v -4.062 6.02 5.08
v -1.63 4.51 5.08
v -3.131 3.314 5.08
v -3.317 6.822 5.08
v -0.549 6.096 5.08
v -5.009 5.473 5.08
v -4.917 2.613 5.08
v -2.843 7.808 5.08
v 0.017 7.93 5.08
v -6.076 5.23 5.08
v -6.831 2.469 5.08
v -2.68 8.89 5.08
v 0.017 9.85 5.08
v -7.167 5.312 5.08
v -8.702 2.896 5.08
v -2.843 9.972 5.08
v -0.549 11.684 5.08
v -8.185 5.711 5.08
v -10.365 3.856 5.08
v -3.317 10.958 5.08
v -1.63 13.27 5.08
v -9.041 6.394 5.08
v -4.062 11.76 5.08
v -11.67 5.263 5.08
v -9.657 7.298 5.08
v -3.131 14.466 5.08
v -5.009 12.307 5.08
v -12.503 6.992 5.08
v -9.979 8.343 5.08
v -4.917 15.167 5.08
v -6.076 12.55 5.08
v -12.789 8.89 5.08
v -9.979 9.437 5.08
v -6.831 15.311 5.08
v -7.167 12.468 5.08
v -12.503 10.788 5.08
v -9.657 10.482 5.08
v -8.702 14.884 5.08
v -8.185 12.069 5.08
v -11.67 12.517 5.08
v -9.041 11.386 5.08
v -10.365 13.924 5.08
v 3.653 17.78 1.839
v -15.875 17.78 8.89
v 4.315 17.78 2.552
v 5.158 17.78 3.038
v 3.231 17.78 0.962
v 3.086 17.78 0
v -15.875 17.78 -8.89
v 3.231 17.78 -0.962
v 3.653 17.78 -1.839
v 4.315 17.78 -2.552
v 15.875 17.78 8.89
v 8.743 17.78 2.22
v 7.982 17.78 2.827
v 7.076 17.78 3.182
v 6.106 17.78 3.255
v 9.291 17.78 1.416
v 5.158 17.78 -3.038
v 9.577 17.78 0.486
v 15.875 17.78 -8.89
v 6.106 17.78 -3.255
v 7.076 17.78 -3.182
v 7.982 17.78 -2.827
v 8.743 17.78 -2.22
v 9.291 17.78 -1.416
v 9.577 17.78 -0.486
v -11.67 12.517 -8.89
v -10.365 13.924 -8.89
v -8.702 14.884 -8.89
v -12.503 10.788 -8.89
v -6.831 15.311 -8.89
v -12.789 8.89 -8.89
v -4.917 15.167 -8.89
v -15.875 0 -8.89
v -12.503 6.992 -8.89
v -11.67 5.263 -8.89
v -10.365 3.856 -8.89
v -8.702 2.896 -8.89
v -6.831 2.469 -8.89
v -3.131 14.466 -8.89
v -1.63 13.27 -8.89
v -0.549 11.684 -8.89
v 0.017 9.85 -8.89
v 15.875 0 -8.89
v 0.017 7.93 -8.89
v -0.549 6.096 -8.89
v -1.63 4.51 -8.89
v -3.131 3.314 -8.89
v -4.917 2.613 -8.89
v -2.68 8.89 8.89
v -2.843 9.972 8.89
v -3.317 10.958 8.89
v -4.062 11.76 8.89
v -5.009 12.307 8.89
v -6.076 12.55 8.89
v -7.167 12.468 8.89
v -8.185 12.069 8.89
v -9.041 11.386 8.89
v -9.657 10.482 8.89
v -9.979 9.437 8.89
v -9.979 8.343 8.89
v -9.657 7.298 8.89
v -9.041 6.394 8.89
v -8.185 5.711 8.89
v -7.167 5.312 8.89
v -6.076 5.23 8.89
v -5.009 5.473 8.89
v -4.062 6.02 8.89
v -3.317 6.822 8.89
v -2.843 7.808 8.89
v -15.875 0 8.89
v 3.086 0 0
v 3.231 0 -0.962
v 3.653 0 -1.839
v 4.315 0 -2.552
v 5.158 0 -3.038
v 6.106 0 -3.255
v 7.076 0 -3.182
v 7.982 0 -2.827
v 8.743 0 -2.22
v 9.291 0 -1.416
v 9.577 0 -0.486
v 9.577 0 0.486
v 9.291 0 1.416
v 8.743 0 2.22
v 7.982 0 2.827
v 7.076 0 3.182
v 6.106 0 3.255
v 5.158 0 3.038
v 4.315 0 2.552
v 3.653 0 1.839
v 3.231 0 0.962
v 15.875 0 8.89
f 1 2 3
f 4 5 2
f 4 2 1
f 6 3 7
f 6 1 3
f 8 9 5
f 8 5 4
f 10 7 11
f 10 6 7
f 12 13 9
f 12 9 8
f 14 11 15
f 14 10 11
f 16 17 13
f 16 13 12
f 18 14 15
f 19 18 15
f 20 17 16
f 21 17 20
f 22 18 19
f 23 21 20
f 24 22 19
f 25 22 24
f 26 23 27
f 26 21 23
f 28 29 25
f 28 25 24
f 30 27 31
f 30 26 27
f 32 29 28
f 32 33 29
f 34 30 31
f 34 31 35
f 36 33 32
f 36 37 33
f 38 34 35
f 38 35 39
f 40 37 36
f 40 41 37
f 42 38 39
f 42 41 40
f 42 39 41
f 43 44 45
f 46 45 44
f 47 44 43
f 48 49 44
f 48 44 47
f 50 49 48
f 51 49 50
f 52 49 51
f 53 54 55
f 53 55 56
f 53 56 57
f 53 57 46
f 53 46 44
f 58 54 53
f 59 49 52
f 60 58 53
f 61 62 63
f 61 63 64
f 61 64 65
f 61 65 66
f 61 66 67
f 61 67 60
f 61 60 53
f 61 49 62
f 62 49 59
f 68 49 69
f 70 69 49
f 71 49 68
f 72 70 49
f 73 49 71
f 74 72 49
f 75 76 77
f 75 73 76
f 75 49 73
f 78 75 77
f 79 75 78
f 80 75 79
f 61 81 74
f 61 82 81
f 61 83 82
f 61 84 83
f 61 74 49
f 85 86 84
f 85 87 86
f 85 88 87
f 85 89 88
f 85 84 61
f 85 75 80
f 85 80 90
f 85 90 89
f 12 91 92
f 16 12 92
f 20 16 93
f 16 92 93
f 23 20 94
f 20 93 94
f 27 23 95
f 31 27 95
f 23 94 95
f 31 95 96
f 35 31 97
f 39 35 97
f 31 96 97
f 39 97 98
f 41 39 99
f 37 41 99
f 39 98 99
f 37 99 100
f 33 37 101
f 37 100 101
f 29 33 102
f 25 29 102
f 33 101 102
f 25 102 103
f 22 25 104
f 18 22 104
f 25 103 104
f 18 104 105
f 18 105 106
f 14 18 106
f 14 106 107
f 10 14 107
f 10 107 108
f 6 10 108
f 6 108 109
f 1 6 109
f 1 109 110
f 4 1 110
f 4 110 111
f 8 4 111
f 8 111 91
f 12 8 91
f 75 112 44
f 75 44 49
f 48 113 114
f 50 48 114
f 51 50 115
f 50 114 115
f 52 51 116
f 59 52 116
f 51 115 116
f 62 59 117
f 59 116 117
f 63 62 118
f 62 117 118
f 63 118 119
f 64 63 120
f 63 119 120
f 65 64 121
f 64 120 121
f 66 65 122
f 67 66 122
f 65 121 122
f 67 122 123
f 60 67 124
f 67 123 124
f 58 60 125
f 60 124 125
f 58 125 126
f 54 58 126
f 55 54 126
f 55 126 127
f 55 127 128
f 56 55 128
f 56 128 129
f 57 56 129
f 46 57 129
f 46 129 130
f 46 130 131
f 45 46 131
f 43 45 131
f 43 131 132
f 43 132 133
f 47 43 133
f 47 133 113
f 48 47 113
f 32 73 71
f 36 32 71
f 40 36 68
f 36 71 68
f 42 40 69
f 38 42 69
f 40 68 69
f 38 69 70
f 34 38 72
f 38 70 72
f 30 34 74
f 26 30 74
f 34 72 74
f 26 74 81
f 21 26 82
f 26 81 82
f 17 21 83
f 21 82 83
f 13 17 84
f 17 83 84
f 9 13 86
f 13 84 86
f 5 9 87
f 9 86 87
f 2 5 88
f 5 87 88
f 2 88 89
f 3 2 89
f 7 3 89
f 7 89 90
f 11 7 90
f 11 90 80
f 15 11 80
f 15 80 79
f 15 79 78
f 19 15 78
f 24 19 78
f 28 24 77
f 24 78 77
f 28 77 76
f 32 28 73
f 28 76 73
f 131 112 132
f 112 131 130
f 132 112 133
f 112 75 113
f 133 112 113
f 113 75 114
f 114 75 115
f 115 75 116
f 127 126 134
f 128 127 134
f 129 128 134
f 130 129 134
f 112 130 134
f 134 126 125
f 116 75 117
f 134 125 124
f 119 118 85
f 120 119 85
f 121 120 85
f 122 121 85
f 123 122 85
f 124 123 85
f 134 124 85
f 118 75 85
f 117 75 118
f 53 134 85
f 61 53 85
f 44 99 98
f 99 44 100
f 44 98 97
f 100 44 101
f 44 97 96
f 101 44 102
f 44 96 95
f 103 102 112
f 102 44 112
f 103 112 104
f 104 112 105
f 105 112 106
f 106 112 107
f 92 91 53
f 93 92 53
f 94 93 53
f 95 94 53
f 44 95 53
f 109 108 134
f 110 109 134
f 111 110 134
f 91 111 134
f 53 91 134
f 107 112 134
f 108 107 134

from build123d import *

# Parameters (mm, degrees)
SKETCH1_W               = 31.75
SKETCH1_H               = 17.78
BOSS_EXTRUDE1_DEPTH     = 17.78
SKETCH3_R               = 6.4389
CUT_EXTRUDE1_DEPTH      = 13.97
CUT_EXTRUDE2_REACH      = 31.737
SKETCH2_R               = 3.6703
F_1_4_CLEARANCE_HOLE1_D = 6.5278


with BuildPart() as part:
    # Sketch1 → Boss-Extrude1 (new body)
    with BuildSketch(Plane(origin=(0, 0, 0), x_dir=(1, 0, 0), z_dir=(0, 1, 0))):
        Rectangle(SKETCH1_W, SKETCH1_H)
    extrude(amount=BOSS_EXTRUDE1_DEPTH)

    # Sketch3 → Cut-Extrude1 (cut)
    with BuildSketch(Plane(origin=(0, 0, -8.89), x_dir=(-1, 0, 0), z_dir=(0, 0, -1))):
        with Locations((6.35, 8.89)):
            Circle(SKETCH3_R)
    extrude(amount=-CUT_EXTRUDE1_DEPTH, mode=Mode.SUBTRACT)

    # Sketch2 → Cut-Extrude2 (cut, up to next)
    with BuildSketch(Plane.XY.offset(8.89), mode=Mode.PRIVATE) as cut_extrude2_sk1:
        with Locations((-6.35, 8.89)):
            Circle(SKETCH2_R)
    cut_extrude2_tool1 = extrude(cut_extrude2_sk1.sketch, amount=-CUT_EXTRUDE2_REACH, mode=Mode.PRIVATE) & part.part
    add(cut_extrude2_tool1.solids().sort_by_distance((-6.35, 8.89, 8.89))[0], mode=Mode.SUBTRACT)

    # 1/4 Clearance Hole1 (through all)
    with Locations(Plane(origin=(0, 17.78, 0), x_dir=(1, 0, 0), z_dir=(0, 1, 0))):
        with Locations((6.35, 0)):
            Hole(F_1_4_CLEARANCE_HOLE1_D / 2)


solid = part.part
